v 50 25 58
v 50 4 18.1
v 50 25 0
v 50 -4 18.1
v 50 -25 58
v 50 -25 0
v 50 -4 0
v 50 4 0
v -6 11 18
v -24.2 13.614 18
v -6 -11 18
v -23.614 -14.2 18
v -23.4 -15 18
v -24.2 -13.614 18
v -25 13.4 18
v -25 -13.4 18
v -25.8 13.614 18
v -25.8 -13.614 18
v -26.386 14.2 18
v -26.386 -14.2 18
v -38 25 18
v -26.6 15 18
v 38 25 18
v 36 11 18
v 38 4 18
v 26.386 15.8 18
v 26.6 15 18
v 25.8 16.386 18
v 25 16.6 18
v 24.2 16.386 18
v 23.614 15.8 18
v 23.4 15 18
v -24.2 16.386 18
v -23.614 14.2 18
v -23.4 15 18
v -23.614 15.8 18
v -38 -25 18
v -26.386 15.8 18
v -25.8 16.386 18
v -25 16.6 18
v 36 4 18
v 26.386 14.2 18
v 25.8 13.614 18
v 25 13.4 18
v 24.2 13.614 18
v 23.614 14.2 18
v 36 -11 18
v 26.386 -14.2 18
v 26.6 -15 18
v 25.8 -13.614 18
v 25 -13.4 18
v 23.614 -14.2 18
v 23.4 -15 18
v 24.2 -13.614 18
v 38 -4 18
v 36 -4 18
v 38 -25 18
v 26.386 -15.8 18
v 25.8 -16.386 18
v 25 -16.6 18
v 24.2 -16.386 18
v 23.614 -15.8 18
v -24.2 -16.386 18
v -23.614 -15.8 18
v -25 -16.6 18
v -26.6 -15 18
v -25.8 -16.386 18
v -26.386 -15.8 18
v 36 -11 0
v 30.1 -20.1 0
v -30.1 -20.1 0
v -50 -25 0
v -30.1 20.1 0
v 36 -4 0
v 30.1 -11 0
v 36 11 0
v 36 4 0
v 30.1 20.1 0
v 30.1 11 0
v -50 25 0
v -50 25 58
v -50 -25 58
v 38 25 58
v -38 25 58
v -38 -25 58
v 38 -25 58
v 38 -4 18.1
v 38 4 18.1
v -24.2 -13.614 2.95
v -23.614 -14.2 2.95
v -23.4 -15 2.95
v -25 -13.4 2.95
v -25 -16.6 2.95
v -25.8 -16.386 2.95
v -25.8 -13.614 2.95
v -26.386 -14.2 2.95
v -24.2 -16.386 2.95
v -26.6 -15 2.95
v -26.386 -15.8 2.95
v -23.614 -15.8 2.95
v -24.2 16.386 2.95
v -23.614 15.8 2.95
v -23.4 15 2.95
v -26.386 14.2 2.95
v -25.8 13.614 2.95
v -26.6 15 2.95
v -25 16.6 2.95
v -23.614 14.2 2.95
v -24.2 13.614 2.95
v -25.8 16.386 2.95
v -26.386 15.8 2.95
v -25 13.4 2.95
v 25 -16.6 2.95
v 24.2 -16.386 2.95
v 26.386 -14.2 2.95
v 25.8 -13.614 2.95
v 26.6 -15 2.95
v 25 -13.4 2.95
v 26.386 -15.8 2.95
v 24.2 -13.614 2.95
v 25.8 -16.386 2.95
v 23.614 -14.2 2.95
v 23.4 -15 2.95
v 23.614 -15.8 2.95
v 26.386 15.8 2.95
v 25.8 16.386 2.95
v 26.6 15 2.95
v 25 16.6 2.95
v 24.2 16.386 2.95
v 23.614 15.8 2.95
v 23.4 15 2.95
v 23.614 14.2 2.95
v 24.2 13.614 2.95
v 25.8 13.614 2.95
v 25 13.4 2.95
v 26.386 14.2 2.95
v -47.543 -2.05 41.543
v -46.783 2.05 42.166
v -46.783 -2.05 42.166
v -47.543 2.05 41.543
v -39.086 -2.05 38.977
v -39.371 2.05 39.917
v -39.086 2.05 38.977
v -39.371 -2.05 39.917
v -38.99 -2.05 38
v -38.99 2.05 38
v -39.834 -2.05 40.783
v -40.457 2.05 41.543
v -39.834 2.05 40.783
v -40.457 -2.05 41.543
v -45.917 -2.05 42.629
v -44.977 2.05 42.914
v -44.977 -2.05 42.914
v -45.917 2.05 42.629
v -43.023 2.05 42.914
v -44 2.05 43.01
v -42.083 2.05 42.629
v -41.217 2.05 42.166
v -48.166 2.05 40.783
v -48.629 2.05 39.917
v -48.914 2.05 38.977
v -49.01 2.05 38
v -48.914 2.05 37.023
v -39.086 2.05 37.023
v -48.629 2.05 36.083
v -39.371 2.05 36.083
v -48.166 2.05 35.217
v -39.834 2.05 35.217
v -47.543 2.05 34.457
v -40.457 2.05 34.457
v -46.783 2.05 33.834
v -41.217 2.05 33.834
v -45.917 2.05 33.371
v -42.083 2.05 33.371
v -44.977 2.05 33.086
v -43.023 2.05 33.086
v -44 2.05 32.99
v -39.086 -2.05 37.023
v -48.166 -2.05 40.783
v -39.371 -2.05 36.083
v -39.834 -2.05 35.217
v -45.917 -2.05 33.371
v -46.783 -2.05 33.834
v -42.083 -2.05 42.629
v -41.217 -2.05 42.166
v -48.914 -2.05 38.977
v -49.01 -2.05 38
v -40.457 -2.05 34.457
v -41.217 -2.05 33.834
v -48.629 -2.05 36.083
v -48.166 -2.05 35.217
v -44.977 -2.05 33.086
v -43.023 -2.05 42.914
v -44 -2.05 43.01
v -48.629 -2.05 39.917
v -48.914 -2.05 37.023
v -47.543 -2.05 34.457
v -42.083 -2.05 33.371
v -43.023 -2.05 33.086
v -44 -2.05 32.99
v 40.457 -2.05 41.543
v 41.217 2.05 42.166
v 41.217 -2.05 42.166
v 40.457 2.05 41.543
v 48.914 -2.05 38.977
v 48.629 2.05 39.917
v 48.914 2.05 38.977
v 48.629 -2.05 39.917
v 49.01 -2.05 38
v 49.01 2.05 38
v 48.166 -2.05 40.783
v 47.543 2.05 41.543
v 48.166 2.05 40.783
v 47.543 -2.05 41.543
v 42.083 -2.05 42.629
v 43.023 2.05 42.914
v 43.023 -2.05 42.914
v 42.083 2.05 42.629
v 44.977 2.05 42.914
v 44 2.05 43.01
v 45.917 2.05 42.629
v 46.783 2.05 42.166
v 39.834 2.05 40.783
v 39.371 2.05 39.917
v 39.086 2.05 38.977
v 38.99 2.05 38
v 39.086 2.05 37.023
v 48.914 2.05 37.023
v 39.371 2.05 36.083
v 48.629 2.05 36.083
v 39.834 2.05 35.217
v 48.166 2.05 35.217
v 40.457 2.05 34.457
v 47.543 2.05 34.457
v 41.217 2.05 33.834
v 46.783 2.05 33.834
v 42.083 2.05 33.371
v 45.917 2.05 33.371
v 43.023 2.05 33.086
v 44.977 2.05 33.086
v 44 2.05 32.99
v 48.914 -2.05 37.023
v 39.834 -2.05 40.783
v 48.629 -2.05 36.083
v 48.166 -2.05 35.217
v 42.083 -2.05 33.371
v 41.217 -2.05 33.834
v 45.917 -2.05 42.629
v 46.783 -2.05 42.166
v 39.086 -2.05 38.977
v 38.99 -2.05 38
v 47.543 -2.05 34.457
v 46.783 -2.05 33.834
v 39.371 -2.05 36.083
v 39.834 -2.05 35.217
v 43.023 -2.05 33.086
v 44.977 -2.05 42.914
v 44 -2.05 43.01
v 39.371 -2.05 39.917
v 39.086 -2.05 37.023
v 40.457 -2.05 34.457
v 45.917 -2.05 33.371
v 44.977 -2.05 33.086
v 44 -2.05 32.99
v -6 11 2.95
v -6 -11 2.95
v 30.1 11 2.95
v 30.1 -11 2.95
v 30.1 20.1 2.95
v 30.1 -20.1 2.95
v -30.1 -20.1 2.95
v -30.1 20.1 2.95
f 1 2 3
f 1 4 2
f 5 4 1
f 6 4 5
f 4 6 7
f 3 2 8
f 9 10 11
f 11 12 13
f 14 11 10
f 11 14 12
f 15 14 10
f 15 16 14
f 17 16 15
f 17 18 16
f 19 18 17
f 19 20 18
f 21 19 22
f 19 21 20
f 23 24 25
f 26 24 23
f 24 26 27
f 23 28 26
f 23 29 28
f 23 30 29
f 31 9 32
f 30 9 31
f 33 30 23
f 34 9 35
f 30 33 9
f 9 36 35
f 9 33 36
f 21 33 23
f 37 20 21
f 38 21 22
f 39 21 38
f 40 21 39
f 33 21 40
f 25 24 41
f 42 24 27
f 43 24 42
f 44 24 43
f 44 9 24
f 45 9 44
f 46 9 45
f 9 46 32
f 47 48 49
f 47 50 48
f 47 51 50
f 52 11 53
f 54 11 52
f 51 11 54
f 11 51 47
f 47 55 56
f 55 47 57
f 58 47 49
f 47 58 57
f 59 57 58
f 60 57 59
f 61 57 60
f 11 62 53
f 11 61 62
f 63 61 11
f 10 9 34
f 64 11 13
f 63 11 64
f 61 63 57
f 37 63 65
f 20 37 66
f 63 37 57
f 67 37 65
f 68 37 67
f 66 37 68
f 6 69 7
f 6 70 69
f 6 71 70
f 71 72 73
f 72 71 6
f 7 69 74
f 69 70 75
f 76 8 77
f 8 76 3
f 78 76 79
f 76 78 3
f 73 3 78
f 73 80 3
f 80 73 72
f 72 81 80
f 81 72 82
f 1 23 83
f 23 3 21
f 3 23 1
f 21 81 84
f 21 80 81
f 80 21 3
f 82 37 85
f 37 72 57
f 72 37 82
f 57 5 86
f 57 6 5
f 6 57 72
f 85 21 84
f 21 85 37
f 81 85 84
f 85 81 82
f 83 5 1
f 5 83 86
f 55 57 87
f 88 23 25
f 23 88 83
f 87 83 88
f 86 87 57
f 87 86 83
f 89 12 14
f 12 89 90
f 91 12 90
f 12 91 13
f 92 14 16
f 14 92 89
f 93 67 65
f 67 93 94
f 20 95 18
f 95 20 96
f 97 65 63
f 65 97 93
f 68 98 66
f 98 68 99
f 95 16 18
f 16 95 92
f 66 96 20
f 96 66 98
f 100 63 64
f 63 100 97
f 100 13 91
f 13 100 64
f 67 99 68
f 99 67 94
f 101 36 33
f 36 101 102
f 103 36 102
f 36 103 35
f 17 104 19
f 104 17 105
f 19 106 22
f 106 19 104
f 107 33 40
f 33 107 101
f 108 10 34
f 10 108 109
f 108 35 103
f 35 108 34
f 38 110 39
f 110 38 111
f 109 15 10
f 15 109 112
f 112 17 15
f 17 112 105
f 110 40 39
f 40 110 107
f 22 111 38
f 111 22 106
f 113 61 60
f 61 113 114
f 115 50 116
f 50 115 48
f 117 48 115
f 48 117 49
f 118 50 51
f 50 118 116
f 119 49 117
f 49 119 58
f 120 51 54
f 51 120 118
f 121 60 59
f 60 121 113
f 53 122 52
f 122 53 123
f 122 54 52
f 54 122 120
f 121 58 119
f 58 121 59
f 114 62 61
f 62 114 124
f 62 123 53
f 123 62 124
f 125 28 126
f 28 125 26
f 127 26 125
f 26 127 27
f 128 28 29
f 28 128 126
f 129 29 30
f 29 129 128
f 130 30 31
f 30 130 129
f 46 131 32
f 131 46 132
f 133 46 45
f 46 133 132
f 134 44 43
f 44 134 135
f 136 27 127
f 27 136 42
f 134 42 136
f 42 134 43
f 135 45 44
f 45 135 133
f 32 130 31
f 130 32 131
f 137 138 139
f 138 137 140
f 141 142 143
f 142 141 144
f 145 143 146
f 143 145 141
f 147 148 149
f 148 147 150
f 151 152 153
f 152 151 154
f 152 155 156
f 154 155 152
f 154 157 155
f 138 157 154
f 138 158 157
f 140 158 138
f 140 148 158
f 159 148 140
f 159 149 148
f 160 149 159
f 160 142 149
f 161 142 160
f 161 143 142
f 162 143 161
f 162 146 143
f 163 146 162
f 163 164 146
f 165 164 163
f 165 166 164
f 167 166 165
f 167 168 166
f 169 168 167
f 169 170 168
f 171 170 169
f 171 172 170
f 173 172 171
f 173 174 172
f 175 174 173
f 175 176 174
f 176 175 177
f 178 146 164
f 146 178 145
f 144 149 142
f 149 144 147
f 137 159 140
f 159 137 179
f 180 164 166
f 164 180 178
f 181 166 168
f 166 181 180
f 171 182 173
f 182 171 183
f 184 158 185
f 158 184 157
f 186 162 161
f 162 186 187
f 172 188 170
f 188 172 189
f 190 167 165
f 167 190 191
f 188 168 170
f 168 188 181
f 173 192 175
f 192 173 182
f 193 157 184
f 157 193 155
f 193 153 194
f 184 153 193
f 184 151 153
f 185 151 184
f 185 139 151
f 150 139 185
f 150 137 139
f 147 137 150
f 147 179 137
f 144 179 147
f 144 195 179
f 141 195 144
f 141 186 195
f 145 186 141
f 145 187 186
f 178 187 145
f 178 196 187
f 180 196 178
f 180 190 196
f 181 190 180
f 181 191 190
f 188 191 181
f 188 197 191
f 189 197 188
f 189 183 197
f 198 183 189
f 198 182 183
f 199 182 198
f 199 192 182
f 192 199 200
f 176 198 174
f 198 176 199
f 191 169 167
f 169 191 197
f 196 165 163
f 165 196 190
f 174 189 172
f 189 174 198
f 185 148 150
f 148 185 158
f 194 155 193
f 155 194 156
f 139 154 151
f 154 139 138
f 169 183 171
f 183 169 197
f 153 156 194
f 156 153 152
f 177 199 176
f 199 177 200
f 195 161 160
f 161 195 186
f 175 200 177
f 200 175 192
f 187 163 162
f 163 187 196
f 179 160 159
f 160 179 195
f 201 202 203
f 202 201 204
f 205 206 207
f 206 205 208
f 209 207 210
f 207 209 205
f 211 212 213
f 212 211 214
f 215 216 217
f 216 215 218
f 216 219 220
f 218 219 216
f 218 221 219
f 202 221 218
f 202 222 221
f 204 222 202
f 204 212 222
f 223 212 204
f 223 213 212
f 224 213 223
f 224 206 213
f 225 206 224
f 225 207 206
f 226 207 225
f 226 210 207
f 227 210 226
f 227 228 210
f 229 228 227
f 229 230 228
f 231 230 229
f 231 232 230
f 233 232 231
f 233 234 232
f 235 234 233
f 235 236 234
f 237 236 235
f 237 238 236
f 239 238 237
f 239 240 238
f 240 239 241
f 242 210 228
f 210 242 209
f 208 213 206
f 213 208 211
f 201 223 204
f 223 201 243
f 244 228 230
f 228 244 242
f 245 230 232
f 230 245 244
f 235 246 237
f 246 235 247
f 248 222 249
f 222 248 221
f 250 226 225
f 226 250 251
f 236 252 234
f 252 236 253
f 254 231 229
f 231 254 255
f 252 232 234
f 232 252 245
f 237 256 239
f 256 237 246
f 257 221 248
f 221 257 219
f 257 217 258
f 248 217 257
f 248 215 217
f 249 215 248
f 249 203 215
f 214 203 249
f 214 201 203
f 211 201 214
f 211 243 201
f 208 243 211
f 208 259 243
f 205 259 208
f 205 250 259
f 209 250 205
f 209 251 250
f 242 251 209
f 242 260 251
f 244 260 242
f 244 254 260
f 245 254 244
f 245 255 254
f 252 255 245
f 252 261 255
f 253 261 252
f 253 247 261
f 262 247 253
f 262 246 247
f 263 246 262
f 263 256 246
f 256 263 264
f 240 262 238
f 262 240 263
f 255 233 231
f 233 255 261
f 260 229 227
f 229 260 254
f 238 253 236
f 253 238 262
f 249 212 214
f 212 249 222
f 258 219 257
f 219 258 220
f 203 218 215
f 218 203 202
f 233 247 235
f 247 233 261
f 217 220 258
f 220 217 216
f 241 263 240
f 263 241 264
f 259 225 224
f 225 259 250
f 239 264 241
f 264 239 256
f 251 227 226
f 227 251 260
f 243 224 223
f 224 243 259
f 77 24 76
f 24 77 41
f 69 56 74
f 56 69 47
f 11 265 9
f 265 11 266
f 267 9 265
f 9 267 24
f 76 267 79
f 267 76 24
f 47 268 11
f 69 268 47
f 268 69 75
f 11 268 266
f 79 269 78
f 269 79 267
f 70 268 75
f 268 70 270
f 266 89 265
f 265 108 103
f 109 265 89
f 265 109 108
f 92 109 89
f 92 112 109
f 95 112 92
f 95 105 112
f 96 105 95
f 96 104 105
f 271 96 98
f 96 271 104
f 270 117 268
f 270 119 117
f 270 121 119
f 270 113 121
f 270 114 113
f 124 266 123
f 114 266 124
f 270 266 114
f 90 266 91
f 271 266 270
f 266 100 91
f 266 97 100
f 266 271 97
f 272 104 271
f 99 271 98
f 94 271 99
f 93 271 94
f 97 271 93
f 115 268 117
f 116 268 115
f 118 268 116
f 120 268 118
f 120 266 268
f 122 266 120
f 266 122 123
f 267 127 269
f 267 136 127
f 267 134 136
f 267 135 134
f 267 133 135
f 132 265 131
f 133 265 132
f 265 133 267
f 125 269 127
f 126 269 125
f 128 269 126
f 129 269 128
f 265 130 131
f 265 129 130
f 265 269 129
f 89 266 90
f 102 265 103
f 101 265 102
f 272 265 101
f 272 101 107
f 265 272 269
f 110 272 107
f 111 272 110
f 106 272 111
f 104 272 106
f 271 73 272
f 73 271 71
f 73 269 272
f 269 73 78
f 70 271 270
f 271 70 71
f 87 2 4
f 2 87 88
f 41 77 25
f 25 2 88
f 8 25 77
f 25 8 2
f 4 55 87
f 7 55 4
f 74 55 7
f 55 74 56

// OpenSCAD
/*
 * malcolm_gimbal_tilt.scad
 * Tilt (elevation) stage for Malcolm GCS directional antenna gimbal
 *
 * Author:  Steve Griffing, PE(CSE), CISSP-ISSEP, CPP
 * License: CC BY 4.0 — creativecommons.org/licenses/by/4.0
 * Revision: R1 (2026-06-11)
 *
 * Description:
 *   The tilt stage rotates the antenna mounting plate about the horizontal
 *   (Y) axis.  It consists of:
 *     - Yoke frame that bolts to the pan turret top boss
 *     - Antenna mount plate (from malcolm_gimbal_mount.scad) pivots on a
 *       4 mm CF pivot rod through two MF104ZZ bearings in the yoke ears
 *     - DS3218MG servo mounted in the yoke body, driving the mount plate
 *       via a pushrod / sector gear
 *     - AS5600 magnetic encoder in the yoke, reading a disc magnet on the
 *       pivot rod for elevation position feedback
 *     - Travel limits: −10° (10° below horizontal) to +90° (vertical up)
 *       Hard stops at −15° and +95° (printed into yoke walls)
 *
 * Material: CF-PETG, 0.15 mm layers, 40% infill, 4 perimeters
 *
 * Mesh verification: run after every geometry change.
 *   openscad -o malcolm_gimbal_tilt.stl malcolm_gimbal_tilt.scad
 *   python3 tools/validate_stls.py
 */

/* ---------------------------------------------------------------------------
 * Render mode: 0 = yoke, 1 = pivot arm stub (attach to mount plate), 2 = exploded
 * ---------------------------------------------------------------------------*/
RENDER_MODE = 0;

/* ---------------------------------------------------------------------------
 * Pivot rod and bearings (same MF104ZZ as nacelle pivot — M1 reuse)
 * ---------------------------------------------------------------------------*/
PIVOT_D     = 4.0;  /* CF pivot rod OD mm                                  */
BRG_OD      = 10.0; /* MF104ZZ bearing OD mm                               */
BRG_ID      = 4.0;  /* MF104ZZ bearing ID mm                               */
BRG_W       = 4.0;  /* MF104ZZ bearing width mm                            */
BRG_PRESS_TOL = 0.02;

/* ---------------------------------------------------------------------------
 * Yoke geometry
 * ---------------------------------------------------------------------------*/
YOKE_W      = 100.0; /* Yoke total width (ear tip to ear tip) mm           */
YOKE_D      = 50.0;  /* Yoke depth (fore-aft) mm                           */
YOKE_BASE_H = 18.0;  /* Yoke base height (below pivot axis) mm             */
EAR_W       = 12.0;  /* Ear plate thickness mm                             */
EAR_H       = 40.0;  /* Ear plate height above base mm                     */
PIVOT_Z     = YOKE_BASE_H + EAR_H / 2; /* Pivot axis height from yoke base mm */

/* ---------------------------------------------------------------------------
 * Servo pocket (DS3218MG, same as aircraft nacelle servos)
 * ---------------------------------------------------------------------------*/
SERVO_W     = 42.0;
SERVO_D     = 22.0;
SERVO_H     = 36.0;  /* Depth pocket below yoke top face                   */

/* ---------------------------------------------------------------------------
 * Base attachment (bolts to pan turret TILT_MOUNT boss from malcolm_gimbal_pan.scad)
 * ---------------------------------------------------------------------------*/
BASE_BOSS_W = 60.0;  /* Must match TILT_MOUNT_W in pan SCAD               */
BASE_BOSS_D = 40.0;  /* Must match TILT_MOUNT_D in pan SCAD               */
BASE_BOSS_H = 6.0;   /* Matching socket depth mm                           */

/* ===========================================================================
 * Modules
 * ===========================================================================*/

module bearing_pocket(x, y, z) {
    /*
     * MF104ZZ press-fit pocket in ear wall.
     * Centred at (x, y, z) with bore along Y axis.
     */
    translate([x, y, z]) {
        rotate([90, 0, 0]) {
            cylinder(d = BRG_OD + BRG_PRESS_TOL, h = BRG_W + 0.1, center = true, $fn = 32);
        }
    }
}

module yoke() {
    /*
     * Yoke frame: U-shaped with flat base and two ears.  Servo mounts in the
     * base body.  Pivot rod runs through both ears along the Y axis.
     */
    difference() {
        union() {
            /* Base body */
            translate([0, 0, YOKE_BASE_H / 2]) {
                cube([YOKE_W, YOKE_D, YOKE_BASE_H], center = true);
            }

            /* Left ear */
            translate([-YOKE_W / 2 + EAR_W / 2, 0, YOKE_BASE_H + EAR_H / 2]) {
                cube([EAR_W, YOKE_D, EAR_H], center = true);
            }

            /* Right ear */
            translate([YOKE_W / 2 - EAR_W / 2, 0, YOKE_BASE_H + EAR_H / 2]) {
                cube([EAR_W, YOKE_D, EAR_H], center = true);
            }
        }

        /* Bearing pockets in ears */
        bearing_pocket(-YOKE_W / 2 + EAR_W / 2, 0, PIVOT_Z);
        bearing_pocket( YOKE_W / 2 - EAR_W / 2, 0, PIVOT_Z);

        /* Servo pocket in base body */
        translate([15, 0, YOKE_BASE_H - SERVO_H / 2]) {
            cube([SERVO_W, SERVO_D, SERVO_H + 0.1], center = true);
        }

        /* Base attachment socket (receives pan turret TILT_MOUNT boss) */
        translate([0, 0, -0.1]) {
            cube([BASE_BOSS_W + 0.2, BASE_BOSS_D + 0.2, BASE_BOSS_H + 0.1], center = true);
        }

        /* M3 bolt holes through base for turret attachment (4×) */
        for (xi = [-1, 1]) {
            for (yi = [-1, 1]) {
                translate([xi * (BASE_BOSS_W / 2 - 5), yi * (BASE_BOSS_D / 2 - 5), -0.1]) {
                    cylinder(d = 3.2, h = BASE_BOSS_H + YOKE_BASE_H + 0.2, $fn = 12);
                }
            }
        }

        /* Wire relief from servo pocket to yoke exterior */
        translate([15 + SERVO_W / 2, 0, YOKE_BASE_H / 2]) {
            cube([YOKE_W - 30 - SERVO_W / 2 + 1, 8, YOKE_BASE_H + 0.2], center = true);
        }
    }
}

/* ===========================================================================
 * Render dispatch
 * ===========================================================================*/
if (RENDER_MODE == 0) {
    yoke();
} else {
    /* Exploded — tilt yoke only for now; antenna mount plate in separate SCAD */
    yoke();
}
